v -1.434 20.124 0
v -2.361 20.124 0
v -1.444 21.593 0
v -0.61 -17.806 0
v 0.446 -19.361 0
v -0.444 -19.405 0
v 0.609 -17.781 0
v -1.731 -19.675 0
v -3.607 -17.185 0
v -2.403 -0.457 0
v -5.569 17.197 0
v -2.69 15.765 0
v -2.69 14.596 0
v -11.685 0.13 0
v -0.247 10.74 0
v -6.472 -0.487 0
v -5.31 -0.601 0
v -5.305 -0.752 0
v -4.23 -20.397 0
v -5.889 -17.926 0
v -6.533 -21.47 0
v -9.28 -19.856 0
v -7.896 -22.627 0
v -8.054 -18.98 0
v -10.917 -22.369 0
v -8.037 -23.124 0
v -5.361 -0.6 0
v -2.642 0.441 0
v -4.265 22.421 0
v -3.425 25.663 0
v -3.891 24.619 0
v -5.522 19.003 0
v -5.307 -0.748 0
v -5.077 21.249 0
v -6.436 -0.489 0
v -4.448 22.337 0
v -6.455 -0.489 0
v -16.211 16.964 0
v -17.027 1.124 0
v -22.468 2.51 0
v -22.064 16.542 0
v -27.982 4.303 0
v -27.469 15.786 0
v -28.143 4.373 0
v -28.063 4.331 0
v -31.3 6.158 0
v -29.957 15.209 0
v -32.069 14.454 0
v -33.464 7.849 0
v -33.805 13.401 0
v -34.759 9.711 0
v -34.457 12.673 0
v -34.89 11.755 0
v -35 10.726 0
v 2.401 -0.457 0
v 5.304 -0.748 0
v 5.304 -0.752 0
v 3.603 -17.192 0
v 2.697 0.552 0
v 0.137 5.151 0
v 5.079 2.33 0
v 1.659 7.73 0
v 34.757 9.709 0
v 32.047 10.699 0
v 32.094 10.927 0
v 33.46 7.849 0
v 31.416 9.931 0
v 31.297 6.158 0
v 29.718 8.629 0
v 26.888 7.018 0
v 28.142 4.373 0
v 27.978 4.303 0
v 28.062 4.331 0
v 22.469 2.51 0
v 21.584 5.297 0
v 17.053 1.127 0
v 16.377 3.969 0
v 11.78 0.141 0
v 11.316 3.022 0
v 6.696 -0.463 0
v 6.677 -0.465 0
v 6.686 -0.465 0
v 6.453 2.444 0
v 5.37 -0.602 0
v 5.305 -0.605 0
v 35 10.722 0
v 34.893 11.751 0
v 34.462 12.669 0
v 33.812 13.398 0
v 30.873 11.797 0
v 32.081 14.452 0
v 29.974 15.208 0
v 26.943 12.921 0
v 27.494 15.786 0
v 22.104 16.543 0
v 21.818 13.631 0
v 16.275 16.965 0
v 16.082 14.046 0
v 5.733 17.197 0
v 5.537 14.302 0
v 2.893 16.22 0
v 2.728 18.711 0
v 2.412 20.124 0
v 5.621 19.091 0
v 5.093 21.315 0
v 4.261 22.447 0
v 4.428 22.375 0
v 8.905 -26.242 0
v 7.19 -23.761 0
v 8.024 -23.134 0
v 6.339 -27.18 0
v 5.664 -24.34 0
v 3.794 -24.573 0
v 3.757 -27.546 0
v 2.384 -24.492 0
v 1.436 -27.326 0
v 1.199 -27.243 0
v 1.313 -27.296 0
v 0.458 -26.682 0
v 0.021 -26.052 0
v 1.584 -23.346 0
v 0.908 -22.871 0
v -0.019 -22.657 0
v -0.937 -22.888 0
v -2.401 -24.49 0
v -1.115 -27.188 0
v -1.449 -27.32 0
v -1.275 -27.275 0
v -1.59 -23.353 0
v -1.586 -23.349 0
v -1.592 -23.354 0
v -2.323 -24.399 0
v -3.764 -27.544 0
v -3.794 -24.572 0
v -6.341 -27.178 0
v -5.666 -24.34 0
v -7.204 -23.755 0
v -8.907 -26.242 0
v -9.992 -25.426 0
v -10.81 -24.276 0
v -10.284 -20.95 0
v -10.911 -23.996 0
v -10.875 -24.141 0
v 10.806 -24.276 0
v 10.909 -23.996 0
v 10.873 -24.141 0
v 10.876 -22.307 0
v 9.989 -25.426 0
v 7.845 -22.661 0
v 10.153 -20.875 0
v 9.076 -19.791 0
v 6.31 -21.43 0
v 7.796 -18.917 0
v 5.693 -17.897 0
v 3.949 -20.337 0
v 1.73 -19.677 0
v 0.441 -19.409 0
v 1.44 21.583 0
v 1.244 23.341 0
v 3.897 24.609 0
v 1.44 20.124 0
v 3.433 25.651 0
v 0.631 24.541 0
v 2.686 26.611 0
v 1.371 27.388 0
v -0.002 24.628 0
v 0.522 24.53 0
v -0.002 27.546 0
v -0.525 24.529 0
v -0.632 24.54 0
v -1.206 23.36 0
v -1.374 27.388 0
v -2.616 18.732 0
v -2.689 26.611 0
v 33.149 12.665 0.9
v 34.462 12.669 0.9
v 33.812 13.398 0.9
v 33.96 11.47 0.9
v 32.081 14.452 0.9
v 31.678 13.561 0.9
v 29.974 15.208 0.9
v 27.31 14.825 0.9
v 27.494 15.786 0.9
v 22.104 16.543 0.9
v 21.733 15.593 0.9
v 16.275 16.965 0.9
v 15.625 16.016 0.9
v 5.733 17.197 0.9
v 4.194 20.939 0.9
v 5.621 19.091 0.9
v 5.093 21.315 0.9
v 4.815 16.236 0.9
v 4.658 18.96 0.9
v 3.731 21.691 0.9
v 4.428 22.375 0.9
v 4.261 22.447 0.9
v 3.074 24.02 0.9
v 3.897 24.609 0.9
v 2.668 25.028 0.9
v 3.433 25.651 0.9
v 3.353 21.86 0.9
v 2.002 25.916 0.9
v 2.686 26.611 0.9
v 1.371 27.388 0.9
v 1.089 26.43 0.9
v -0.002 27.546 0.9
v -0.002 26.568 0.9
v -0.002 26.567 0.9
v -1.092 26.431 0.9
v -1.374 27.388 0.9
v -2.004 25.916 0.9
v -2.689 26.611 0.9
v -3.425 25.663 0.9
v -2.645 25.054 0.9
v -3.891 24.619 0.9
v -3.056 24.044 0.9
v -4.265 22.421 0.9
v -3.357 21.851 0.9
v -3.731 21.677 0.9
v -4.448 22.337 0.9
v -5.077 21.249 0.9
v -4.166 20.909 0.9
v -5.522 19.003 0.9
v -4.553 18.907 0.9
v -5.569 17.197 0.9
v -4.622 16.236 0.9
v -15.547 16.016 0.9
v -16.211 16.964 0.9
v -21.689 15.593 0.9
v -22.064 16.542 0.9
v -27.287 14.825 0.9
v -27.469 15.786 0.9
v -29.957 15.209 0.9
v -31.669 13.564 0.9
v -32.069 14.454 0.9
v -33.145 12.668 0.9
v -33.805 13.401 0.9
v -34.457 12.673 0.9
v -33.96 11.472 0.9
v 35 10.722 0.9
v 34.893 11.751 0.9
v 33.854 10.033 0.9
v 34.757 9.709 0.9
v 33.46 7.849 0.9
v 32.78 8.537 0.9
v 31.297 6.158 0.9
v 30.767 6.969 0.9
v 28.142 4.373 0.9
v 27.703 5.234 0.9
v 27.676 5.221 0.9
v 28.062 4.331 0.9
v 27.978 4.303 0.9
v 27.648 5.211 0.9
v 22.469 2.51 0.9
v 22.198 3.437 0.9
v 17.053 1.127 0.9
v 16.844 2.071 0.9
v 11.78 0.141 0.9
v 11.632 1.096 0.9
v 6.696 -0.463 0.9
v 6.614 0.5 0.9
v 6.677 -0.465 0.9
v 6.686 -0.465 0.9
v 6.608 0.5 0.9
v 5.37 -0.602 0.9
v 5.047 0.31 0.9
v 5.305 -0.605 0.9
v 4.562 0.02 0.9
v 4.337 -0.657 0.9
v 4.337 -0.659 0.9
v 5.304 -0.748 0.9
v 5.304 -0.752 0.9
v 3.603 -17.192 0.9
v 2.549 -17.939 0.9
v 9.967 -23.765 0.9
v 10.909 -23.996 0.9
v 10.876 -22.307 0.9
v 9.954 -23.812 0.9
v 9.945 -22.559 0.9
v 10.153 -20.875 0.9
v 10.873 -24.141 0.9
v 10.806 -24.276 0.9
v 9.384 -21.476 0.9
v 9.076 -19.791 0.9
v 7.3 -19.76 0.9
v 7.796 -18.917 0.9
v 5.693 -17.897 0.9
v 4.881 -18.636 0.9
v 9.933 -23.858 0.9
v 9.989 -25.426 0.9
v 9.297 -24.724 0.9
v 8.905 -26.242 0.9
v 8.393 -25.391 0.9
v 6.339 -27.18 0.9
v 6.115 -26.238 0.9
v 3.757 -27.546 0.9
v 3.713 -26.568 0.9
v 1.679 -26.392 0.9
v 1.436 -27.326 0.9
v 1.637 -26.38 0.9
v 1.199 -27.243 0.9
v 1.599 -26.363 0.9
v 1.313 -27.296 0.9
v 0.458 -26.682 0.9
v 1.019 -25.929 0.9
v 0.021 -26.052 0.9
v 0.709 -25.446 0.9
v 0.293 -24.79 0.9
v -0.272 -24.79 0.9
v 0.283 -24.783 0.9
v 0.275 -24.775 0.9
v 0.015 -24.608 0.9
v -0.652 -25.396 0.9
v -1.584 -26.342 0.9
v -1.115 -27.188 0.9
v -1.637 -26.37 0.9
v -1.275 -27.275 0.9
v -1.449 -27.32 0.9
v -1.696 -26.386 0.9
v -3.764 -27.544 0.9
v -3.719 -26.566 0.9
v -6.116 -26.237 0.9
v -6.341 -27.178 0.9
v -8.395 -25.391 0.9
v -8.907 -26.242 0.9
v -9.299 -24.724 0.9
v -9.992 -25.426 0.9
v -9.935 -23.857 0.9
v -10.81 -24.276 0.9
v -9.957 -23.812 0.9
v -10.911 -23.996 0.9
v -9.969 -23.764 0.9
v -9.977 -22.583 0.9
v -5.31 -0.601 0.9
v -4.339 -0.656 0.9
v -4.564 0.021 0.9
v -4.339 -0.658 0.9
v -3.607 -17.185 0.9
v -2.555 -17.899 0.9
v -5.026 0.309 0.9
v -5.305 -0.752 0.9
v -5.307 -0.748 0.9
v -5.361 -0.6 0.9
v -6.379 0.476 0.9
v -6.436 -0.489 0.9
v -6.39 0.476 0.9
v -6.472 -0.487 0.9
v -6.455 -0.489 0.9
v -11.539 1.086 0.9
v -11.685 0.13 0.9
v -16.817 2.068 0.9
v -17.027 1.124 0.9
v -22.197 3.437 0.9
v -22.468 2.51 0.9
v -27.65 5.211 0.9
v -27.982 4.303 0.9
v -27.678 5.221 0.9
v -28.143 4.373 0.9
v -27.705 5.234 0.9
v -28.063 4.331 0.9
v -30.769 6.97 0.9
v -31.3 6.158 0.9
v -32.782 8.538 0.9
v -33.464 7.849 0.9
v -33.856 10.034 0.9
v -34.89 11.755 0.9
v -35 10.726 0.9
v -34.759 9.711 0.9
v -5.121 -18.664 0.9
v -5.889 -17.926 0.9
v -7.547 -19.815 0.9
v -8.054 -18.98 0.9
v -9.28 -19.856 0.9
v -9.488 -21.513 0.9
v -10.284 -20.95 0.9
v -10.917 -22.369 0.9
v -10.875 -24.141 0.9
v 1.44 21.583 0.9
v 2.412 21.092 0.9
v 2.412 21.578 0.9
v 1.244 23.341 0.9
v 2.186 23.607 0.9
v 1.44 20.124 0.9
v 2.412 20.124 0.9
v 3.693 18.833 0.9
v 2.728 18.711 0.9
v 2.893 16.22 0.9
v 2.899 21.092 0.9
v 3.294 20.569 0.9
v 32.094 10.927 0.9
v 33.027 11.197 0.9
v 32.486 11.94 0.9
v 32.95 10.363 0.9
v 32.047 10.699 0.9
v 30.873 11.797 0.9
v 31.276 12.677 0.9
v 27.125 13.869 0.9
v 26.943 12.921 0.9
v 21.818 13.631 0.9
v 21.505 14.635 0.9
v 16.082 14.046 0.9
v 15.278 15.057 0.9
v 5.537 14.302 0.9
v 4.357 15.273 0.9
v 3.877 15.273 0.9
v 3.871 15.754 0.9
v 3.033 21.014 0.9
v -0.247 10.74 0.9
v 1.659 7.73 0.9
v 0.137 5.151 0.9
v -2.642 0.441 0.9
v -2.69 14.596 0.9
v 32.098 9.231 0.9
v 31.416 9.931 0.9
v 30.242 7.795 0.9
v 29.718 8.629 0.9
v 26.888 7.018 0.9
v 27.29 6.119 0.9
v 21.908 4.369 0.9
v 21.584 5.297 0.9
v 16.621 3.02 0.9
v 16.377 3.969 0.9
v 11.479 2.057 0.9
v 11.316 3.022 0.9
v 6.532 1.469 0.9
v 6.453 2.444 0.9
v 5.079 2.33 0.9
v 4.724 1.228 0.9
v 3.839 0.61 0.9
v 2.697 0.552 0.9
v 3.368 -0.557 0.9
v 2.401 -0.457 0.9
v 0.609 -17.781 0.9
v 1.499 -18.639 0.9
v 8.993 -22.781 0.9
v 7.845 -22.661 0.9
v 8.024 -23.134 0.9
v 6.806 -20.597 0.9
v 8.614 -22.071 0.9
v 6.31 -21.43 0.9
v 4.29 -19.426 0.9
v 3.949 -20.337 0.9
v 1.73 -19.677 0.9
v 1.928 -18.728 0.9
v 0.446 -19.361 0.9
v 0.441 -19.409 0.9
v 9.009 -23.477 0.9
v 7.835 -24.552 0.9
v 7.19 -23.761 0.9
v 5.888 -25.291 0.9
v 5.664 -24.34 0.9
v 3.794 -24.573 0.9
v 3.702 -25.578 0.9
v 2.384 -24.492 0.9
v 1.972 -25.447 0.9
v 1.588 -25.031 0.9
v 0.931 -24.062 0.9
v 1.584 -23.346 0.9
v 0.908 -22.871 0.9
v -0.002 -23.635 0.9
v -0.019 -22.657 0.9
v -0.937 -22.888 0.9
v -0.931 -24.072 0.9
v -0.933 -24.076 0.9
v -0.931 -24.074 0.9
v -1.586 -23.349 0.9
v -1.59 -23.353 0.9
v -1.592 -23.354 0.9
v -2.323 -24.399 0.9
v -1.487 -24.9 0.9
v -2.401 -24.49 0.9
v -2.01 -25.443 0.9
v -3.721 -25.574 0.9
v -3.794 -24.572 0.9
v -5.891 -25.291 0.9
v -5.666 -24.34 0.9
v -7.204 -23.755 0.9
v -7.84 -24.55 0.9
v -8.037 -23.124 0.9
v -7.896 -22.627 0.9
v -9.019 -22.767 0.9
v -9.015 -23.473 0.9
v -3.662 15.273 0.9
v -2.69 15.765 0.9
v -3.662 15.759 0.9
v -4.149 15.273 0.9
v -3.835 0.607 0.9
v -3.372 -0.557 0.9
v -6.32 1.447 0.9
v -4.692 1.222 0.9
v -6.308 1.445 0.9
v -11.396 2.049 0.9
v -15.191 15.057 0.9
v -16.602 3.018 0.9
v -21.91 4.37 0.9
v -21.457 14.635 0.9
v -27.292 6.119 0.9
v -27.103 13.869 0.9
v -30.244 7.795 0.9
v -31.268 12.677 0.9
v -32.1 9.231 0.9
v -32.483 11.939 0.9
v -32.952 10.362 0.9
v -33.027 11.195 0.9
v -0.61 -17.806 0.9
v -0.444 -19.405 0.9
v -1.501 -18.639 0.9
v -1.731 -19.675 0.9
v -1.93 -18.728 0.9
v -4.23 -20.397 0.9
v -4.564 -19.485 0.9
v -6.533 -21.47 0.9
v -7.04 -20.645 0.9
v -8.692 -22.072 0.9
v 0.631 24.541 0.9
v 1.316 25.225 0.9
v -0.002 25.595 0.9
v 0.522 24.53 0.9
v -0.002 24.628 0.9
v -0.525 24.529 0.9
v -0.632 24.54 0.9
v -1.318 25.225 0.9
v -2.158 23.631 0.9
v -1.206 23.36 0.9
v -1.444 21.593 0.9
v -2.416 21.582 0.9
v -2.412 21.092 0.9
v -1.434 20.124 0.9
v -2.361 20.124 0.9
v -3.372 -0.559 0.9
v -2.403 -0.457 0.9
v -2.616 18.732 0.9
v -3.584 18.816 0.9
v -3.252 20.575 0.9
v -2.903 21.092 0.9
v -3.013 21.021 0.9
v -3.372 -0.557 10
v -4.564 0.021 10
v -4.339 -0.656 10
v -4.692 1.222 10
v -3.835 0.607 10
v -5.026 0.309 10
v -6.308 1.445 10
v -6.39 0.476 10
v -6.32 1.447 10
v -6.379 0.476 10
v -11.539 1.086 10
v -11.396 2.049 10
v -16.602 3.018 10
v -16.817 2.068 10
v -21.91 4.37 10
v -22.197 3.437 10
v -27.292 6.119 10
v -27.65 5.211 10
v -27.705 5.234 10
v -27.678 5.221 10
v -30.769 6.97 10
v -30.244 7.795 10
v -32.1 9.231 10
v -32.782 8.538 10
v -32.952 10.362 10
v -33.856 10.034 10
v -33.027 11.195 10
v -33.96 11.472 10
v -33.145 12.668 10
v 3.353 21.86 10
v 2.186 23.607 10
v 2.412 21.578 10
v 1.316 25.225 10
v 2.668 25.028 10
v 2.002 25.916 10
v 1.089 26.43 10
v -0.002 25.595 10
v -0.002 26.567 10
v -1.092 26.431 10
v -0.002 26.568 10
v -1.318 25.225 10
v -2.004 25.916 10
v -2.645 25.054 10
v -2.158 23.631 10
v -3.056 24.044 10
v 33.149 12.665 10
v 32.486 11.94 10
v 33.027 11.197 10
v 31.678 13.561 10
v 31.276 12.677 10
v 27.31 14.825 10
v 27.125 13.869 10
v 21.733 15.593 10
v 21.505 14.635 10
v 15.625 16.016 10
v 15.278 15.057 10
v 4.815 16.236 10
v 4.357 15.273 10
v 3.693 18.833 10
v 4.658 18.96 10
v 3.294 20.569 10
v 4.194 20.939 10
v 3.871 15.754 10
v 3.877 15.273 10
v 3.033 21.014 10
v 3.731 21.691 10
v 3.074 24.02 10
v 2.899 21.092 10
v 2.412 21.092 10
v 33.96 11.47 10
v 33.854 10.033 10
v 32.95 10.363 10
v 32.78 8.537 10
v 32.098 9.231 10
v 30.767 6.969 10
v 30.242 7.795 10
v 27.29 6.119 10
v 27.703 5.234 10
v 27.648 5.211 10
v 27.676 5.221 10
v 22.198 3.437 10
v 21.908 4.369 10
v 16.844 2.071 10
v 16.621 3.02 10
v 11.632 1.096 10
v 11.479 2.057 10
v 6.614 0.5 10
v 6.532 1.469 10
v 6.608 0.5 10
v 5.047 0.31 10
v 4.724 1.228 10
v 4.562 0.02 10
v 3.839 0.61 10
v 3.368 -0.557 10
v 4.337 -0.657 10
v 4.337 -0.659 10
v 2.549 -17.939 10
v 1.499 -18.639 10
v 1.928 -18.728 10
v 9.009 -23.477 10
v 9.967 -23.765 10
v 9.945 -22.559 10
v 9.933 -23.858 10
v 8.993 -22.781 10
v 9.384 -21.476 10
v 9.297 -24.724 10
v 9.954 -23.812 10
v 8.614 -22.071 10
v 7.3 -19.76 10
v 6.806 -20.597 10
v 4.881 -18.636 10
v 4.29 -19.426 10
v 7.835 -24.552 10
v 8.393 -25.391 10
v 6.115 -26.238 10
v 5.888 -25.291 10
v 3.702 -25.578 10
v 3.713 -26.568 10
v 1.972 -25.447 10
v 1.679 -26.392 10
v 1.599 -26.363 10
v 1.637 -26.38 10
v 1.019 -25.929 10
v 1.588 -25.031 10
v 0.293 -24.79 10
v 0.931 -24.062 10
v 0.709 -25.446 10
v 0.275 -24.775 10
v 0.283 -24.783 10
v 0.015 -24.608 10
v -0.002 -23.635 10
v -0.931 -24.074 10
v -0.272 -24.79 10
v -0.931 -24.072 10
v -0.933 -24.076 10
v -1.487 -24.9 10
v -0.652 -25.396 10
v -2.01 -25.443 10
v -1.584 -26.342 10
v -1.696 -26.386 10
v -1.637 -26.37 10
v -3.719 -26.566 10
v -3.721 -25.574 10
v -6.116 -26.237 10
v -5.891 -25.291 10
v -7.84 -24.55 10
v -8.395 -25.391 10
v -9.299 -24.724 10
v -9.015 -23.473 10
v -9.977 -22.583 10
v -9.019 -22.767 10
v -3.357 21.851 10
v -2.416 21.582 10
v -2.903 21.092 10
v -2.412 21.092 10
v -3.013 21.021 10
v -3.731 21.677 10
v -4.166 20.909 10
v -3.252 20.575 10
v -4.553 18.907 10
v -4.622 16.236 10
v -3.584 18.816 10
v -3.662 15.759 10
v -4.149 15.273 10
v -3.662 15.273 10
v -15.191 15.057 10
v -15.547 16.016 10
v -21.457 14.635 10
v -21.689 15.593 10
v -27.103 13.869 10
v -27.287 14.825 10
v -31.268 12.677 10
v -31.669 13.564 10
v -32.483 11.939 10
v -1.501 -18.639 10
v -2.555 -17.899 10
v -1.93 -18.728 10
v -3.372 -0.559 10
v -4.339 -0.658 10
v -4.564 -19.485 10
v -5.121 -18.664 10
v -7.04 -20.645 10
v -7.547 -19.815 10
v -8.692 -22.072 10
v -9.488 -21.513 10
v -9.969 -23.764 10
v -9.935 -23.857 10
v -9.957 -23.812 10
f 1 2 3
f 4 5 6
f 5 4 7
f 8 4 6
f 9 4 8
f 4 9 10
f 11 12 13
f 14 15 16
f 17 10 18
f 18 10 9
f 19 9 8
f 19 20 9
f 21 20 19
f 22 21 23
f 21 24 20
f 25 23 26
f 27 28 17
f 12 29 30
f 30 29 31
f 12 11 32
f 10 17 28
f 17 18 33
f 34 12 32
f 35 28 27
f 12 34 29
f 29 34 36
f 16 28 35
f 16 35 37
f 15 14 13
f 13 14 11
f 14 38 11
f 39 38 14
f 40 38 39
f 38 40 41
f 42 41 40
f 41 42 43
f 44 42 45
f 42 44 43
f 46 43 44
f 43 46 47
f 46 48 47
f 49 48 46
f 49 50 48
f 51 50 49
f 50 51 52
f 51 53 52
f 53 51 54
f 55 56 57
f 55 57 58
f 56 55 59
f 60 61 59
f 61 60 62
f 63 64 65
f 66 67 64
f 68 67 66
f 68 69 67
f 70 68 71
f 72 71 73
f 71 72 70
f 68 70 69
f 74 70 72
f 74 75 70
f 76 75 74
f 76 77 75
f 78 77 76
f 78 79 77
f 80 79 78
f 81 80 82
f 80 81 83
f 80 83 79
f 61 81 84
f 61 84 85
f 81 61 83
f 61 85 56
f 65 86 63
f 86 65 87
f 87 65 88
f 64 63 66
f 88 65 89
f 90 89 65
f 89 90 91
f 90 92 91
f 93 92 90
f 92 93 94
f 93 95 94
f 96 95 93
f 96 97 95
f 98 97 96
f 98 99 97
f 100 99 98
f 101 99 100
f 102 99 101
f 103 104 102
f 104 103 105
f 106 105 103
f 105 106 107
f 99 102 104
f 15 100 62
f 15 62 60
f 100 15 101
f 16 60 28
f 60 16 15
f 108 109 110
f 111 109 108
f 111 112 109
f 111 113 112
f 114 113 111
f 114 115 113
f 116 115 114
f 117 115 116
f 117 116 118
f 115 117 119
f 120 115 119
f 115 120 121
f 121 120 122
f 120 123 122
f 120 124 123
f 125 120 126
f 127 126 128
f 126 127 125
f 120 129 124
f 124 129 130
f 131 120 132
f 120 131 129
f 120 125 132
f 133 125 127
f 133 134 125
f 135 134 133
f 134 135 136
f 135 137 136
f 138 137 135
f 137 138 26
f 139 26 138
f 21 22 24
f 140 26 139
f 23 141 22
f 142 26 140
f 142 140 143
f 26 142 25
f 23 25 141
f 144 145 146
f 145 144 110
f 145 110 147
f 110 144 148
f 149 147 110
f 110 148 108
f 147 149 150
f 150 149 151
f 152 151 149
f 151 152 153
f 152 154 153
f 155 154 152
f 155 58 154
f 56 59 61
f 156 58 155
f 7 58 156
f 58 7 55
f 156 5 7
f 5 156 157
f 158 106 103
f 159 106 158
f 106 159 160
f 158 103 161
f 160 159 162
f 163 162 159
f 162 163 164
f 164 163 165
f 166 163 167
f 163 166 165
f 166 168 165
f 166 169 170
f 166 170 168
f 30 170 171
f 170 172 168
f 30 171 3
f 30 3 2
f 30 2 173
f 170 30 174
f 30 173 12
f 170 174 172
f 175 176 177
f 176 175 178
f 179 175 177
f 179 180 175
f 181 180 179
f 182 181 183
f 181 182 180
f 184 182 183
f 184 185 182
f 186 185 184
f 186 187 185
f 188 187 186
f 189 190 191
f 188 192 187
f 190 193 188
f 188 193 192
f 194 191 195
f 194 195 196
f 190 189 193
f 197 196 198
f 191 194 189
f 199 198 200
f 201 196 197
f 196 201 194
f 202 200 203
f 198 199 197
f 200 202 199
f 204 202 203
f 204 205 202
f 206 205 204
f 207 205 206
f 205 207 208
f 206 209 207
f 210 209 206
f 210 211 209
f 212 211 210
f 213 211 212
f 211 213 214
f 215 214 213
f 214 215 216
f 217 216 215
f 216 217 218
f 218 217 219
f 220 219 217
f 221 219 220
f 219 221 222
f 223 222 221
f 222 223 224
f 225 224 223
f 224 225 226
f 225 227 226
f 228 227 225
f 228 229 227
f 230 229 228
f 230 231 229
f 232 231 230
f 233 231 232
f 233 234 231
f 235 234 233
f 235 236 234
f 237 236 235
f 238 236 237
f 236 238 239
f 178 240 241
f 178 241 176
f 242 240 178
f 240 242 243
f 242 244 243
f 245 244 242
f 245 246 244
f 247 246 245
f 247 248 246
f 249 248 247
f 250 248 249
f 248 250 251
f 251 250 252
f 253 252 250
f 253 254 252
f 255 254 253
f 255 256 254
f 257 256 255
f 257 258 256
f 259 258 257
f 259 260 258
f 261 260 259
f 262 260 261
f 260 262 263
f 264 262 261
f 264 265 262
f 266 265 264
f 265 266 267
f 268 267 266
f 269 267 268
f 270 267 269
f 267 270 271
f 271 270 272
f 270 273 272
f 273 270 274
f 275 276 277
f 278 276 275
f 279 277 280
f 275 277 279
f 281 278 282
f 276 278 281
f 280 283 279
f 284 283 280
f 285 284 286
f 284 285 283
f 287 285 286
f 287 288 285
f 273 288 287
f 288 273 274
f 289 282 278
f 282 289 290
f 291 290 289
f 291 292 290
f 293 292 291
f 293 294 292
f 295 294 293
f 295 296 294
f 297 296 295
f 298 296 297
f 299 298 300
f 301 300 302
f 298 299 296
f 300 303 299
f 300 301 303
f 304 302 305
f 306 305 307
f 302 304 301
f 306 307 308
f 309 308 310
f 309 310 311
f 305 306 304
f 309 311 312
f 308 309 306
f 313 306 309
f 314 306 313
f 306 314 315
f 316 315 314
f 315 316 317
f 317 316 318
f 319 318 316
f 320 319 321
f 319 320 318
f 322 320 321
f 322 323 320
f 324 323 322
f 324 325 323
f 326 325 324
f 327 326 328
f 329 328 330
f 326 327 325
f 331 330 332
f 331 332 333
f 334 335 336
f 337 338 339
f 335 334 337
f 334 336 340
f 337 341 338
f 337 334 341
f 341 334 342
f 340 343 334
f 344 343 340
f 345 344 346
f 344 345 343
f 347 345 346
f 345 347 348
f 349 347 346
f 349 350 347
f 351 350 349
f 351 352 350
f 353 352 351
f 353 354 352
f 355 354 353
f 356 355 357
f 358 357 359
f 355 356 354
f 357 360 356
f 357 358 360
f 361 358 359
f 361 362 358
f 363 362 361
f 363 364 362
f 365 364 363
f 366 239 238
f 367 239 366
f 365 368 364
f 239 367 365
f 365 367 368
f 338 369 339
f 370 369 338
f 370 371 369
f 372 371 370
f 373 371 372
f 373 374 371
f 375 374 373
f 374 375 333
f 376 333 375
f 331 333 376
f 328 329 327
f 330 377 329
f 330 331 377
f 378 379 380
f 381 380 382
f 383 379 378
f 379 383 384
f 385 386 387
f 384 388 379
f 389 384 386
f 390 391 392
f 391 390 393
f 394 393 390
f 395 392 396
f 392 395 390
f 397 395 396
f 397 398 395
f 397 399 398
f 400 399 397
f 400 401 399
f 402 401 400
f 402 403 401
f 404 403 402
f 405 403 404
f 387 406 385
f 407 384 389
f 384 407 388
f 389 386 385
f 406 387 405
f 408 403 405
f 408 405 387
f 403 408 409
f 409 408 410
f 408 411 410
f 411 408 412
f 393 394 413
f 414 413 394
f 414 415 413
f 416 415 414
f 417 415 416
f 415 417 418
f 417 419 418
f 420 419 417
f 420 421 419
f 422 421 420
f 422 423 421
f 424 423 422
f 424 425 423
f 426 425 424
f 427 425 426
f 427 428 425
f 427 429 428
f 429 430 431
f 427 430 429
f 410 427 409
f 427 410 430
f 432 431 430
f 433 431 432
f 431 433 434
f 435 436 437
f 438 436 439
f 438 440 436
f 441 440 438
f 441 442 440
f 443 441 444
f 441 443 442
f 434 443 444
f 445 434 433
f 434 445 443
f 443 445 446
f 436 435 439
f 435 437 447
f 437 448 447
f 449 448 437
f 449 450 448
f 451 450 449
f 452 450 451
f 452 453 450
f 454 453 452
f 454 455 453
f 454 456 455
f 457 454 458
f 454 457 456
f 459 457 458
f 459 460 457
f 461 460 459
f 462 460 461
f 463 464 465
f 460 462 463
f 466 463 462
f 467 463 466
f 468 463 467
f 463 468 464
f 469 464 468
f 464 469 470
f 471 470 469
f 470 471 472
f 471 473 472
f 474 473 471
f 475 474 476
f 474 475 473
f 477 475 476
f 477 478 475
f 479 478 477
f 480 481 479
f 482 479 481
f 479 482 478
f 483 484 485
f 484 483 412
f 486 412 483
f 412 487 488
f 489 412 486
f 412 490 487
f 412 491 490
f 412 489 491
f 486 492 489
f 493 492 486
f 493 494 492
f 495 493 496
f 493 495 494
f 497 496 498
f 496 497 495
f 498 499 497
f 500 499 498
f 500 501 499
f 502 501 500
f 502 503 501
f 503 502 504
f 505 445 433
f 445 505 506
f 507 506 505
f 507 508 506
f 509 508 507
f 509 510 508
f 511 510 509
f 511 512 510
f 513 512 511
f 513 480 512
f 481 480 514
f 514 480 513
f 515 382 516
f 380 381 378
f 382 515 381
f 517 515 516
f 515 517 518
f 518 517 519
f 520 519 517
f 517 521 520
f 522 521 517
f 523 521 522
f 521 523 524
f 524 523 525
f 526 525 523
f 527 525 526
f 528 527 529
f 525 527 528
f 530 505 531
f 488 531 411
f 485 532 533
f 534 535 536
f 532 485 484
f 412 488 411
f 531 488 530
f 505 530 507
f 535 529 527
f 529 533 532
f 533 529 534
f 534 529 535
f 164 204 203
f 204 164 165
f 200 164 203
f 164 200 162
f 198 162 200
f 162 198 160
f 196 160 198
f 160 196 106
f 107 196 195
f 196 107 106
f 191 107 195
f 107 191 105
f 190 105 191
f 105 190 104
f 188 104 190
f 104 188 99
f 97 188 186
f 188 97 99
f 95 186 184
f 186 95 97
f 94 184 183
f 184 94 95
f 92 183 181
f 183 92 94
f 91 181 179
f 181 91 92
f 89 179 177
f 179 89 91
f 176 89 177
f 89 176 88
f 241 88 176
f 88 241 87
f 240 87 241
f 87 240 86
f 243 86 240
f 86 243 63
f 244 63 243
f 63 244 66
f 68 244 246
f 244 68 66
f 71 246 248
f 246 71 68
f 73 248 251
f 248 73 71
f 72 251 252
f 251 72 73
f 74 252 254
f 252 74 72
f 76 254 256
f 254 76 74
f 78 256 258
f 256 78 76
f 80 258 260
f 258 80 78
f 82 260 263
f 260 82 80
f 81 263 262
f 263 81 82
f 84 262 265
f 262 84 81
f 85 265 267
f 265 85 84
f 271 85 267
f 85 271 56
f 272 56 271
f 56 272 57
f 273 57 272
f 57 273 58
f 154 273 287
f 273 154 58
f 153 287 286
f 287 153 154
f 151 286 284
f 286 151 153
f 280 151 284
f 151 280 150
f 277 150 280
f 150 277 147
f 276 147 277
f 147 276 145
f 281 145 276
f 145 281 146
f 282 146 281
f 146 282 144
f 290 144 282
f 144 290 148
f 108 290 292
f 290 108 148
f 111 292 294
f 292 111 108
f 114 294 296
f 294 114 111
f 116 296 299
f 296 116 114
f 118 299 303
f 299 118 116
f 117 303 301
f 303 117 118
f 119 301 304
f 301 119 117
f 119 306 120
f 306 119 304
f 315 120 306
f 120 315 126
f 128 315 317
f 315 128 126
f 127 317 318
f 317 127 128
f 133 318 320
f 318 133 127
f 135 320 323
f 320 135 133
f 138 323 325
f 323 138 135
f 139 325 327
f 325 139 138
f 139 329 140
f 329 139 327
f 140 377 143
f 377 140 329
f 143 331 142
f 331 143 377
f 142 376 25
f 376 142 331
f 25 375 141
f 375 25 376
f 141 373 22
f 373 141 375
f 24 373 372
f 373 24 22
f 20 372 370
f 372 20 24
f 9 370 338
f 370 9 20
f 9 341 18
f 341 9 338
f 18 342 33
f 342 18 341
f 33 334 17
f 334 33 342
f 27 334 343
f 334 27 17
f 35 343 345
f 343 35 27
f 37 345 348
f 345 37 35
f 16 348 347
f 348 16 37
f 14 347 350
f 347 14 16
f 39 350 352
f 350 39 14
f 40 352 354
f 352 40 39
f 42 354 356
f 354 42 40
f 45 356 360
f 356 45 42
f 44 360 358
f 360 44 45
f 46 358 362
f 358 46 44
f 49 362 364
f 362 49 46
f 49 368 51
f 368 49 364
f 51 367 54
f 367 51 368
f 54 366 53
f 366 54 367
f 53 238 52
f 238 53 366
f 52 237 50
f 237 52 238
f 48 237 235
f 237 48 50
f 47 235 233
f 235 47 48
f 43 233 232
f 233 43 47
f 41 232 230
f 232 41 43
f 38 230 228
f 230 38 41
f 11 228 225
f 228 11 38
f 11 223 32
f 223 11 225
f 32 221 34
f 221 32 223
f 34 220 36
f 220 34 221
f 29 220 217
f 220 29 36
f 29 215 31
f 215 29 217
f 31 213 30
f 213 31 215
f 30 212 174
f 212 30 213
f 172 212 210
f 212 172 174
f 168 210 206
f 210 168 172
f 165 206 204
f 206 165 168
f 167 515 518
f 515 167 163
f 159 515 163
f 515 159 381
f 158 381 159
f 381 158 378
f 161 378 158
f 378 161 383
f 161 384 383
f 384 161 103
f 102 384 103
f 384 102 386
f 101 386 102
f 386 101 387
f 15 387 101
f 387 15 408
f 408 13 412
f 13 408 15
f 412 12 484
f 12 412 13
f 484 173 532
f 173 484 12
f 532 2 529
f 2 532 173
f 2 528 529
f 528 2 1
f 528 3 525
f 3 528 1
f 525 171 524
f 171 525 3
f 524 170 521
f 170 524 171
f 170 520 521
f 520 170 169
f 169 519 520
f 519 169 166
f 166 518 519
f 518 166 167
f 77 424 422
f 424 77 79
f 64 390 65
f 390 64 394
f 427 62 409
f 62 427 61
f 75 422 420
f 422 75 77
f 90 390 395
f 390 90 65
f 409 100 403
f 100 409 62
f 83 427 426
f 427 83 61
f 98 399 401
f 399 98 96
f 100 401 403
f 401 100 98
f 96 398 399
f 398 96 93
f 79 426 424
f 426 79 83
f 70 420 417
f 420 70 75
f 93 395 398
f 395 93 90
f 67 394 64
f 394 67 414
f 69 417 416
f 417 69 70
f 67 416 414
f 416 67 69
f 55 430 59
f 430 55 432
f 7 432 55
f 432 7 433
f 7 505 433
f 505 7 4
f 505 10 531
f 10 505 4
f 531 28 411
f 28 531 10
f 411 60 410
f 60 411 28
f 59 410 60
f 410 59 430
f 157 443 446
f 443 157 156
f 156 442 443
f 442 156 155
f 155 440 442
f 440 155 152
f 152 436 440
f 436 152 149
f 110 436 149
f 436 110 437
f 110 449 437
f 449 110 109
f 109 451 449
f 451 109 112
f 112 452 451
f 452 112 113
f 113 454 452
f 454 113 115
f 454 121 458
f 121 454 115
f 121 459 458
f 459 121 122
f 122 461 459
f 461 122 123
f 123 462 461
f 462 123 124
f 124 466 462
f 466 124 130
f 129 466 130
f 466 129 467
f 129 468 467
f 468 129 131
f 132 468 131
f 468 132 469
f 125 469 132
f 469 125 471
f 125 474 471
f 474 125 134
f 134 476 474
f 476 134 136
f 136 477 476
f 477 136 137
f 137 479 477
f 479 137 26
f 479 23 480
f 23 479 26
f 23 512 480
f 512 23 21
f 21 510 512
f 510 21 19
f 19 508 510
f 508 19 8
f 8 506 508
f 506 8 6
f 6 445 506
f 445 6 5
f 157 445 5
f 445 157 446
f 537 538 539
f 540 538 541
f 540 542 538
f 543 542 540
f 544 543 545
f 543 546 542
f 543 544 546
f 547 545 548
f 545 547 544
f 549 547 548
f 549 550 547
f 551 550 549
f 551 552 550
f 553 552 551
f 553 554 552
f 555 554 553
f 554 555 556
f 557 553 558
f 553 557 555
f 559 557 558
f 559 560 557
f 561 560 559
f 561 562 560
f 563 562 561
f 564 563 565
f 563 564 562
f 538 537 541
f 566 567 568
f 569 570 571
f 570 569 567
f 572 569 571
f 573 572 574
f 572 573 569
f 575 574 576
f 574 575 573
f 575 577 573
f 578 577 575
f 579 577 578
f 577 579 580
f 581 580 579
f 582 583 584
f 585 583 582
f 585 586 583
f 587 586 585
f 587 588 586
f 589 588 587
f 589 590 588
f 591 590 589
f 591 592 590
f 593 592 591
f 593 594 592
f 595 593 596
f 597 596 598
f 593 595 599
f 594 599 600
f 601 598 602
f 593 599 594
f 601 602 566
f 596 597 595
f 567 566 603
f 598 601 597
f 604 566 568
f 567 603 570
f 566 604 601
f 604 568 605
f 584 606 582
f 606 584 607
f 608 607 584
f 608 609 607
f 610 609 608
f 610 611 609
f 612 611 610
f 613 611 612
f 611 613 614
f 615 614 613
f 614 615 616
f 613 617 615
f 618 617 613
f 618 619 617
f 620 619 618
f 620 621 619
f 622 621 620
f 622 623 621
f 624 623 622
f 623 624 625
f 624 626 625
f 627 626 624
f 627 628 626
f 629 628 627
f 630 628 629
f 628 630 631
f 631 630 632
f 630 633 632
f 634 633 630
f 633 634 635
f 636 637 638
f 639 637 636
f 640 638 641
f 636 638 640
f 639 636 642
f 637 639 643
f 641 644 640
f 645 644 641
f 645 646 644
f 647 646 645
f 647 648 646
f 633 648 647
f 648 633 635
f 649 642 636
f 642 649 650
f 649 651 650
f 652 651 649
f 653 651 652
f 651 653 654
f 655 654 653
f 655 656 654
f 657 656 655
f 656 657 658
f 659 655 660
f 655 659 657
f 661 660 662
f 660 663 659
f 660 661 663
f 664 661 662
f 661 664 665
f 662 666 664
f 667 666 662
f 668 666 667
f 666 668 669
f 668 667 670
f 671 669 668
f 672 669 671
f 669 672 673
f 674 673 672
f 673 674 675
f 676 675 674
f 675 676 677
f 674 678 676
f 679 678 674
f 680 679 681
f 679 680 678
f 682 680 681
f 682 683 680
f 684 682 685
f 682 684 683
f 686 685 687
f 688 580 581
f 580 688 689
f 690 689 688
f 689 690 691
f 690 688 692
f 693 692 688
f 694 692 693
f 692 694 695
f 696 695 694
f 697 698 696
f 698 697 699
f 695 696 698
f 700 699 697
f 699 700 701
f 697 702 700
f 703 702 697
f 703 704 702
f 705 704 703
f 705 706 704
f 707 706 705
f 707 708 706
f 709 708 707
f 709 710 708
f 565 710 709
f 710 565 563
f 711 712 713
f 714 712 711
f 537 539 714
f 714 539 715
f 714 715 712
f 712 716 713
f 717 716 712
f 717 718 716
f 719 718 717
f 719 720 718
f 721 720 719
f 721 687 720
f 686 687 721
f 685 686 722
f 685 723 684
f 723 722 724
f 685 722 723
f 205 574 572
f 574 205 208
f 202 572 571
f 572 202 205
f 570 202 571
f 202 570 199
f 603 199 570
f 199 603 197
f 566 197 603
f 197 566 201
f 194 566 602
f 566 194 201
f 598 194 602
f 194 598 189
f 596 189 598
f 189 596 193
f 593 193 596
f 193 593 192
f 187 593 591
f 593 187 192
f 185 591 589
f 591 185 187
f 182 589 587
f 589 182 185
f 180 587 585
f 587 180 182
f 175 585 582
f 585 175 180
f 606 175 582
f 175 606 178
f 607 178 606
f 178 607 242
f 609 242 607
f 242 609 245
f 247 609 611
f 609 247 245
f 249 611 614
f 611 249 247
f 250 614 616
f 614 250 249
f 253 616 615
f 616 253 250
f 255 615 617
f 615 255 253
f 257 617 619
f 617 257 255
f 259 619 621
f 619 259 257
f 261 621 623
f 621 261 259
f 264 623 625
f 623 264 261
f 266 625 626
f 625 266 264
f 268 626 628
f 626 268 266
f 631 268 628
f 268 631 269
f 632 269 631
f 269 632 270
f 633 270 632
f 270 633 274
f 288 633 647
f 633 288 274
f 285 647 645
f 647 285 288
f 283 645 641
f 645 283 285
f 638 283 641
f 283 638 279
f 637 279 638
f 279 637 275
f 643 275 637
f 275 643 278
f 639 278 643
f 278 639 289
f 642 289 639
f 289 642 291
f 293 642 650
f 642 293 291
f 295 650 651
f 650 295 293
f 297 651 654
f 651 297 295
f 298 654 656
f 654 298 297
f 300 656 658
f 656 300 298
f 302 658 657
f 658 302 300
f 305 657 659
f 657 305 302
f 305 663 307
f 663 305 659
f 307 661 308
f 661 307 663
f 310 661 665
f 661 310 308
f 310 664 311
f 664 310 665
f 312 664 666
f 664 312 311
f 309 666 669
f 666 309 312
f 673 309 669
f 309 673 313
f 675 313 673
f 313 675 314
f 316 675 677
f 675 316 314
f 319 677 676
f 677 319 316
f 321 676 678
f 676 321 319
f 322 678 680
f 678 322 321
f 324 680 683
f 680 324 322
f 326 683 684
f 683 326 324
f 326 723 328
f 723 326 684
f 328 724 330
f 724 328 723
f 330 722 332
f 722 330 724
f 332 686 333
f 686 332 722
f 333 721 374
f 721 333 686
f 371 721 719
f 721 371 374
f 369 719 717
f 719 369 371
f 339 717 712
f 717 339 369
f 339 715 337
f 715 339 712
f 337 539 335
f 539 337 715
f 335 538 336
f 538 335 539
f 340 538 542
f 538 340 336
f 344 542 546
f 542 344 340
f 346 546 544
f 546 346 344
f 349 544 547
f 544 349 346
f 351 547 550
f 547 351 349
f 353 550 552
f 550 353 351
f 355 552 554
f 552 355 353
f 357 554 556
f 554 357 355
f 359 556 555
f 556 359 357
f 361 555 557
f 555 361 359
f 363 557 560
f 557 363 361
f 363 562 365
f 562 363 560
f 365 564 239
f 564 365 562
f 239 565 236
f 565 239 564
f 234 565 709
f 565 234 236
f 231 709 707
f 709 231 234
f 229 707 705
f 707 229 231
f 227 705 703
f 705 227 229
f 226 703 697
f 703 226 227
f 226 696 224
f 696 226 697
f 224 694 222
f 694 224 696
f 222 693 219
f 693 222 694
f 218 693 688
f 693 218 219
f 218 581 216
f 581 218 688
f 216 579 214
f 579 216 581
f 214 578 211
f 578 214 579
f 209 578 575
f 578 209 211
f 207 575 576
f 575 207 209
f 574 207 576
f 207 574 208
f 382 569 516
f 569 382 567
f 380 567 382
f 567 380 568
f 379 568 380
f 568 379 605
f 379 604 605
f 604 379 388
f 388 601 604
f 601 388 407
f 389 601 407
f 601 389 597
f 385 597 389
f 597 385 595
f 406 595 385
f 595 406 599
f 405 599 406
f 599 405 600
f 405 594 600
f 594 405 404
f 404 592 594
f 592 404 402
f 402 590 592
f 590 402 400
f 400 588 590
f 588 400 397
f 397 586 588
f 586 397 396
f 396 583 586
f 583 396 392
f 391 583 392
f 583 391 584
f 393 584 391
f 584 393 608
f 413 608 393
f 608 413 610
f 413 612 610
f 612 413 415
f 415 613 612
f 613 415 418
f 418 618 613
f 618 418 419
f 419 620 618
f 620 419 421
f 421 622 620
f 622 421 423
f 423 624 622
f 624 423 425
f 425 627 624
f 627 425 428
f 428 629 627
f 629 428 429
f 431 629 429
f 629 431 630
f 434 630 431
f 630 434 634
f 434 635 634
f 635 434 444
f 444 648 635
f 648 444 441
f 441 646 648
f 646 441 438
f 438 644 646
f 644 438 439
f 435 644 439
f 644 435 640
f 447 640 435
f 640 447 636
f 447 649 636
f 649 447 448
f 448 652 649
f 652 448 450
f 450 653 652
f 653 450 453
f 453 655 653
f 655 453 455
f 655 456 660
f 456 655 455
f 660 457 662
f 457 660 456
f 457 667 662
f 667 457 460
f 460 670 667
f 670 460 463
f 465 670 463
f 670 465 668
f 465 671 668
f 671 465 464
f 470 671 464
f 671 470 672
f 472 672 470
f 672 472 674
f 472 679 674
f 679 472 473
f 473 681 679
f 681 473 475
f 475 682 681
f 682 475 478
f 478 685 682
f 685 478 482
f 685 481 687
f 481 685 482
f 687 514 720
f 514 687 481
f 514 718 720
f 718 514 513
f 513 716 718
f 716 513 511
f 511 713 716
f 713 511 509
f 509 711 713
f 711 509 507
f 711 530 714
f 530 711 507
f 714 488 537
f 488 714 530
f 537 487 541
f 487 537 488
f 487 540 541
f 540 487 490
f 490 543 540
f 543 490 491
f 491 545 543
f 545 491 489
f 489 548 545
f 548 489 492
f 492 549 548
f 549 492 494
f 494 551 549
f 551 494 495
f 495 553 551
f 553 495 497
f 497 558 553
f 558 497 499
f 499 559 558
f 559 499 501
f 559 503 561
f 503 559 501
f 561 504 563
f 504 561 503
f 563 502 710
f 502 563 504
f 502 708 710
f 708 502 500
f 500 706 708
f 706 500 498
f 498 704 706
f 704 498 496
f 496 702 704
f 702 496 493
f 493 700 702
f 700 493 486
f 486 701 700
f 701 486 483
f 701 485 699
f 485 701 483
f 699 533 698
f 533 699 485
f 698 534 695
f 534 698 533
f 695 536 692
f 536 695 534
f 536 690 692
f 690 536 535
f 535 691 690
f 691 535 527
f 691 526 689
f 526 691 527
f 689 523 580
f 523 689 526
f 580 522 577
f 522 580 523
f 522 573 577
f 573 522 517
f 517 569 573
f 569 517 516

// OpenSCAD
// file: shape.scad
// Module names are of the form poly_<inkscape-path-id>().  As a result,
// you can associate a polygon in this OpenSCAD program with the corresponding
// SVG element in the Inkscape document by looking for the XML element with
// the attribute id="inkscape-path-id".

// fudge value is used to ensure that subtracted solids are a tad taller
// in the z dimension than the polygon being subtracted from.  This helps
// keep the resulting .stl file manifold.
fudge = 0.1;

module shape(h)
{
  scale([25.4/90, -25.4/90, 1]) union()
  {
    difference()
    {
       linear_extrude(height=h)
         polygon([[-0.002028,-27.317476],[-1.122322,-27.176346],[-2.060622,-26.647556],[-2.720053,-25.761085],[-3.141839,-24.722758],[-3.451247,-22.467876],[-3.836013,-22.288186],[-4.283278,-21.499126],[-4.681716,-19.440526],[-4.752026,-16.694436],[-15.985517,-16.468408],[-22.300496,-16.033137],[-28.056714,-15.243266],[-32.562573,-13.946386],[-34.079739,-13.025193],[-34.918042,-11.795996],[-34.810950,-10.317131],[-33.707104,-8.778416],[-31.636780,-7.166340],[-28.486401,-5.381936],[-28.459061,-5.368236],[-28.429761,-5.358236],[-22.823024,-3.534388],[-17.291646,-2.126090],[-11.864481,-1.116580],[-6.570385,-0.489096],[-6.564485,-0.489096],[-6.558585,-0.489096],[-5.167960,-0.317216],[-4.692959,-0.021729],[-4.460929,0.674964],[-4.460929,0.676964],[-2.626944,18.403524],[-5.265400,19.190746],[-7.759757,20.374224],[-9.755850,22.120324],[-10.258517,23.220035],[-10.249991,24.434774],[-10.238271,24.483574],[-10.214831,24.530474],[-9.561131,25.421700],[-8.631607,26.107704],[-6.289049,26.977744],[-3.824057,27.315371],[-1.744128,27.130084],[-1.683578,27.114484],[-1.628888,27.085184],[-0.669904,26.112524],[-0.279279,25.489484],[0.015643,25.301984],[0.283221,25.473854],[0.291021,25.481854],[0.300821,25.489854],[0.728556,26.163674],[1.047996,26.660936],[1.644571,27.107034],[1.683631,27.124634],[1.726601,27.136334],[3.817312,27.317476],[6.287148,26.978134],[8.630256,26.107741],[9.559492,25.421842],[10.212930,24.530864],[10.234410,24.483964],[10.248080,24.435164],[10.225259,23.195392],[9.648471,22.081644],[7.505892,20.317974],[5.018742,19.161474],[2.621127,18.444924],[4.459017,0.677354],[4.459017,0.675354],[4.691029,-0.020222],[5.189486,-0.318786],[6.794955,-0.514096],[6.796955,-0.514096],[6.800855,-0.514096],[11.960606,-1.127123],[17.318766,-2.129069],[22.824710,-3.534465],[28.427808,-5.357846],[28.457108,-5.367846],[28.484448,-5.381546],[31.634696,-7.165984],[33.705151,-8.778026],[34.809266,-10.315733],[34.918042,-11.793656],[34.084069,-13.022789],[32.572339,-13.944046],[28.080151,-15.242876],[22.346307,-16.032999],[16.065917,-16.468149],[4.951245,-16.694046],[4.789135,-19.494826],[4.312573,-21.529986],[3.836011,-22.303416],[3.447339,-22.477246],[3.160891,-24.697502],[2.742813,-25.734410],[2.058667,-26.647166],[1.119391,-27.175956],[-0.001880,-27.317086]]);
       translate([0, 0, -fudge])
         linear_extrude(height=h+2*fudge)
           polygon([[-0.002028,-26.317476],[1.353441,-25.936626],[2.247213,-24.273299],[2.480394,-22.186626],[2.480394,-21.686626],[2.980394,-21.686626],[3.119066,-21.606526],[3.386644,-21.149496],[3.796800,-19.364336],[3.980394,-16.198316],[3.986294,-15.704176],[4.480435,-15.704176],[15.708598,-15.481546],[22.111505,-15.047773],[27.890591,-14.260816],[32.158169,-13.034256],[33.402619,-12.276520],[33.958950,-11.512776],[33.879960,-10.655868],[33.003872,-9.491286],[31.095309,-8.014703],[28.060513,-6.292066],[22.526040,-4.492348],[17.089540,-3.104776],[11.802589,-2.115538],[6.716763,-1.510816],[4.857388,-1.262776],[3.947251,-0.627121],[3.462857,0.573164],[1.540982,19.164964],[1.982388,19.256764],[4.411204,19.974077],[6.998013,21.178644],[8.857388,22.694264],[9.246837,23.423666],[9.263638,24.139584],[8.055622,25.244256],[6.054654,26.004814],[3.806452,26.299589],[2.027310,26.164974],[1.632778,25.737234],[0.956997,24.741144],[-0.001987,24.301694],[-0.957065,24.750904],[-0.957065,24.752904],[-0.959065,24.754904],[-1.529378,25.602564],[-2.066487,26.161154],[-3.825517,26.295965],[-6.056722,26.004904],[-8.060980,25.242886],[-9.269612,24.135764],[-9.273129,23.409085],[-8.937581,22.694354],[-7.238362,21.227564],[-4.692610,20.034875],[-1.984456,19.256854],[-1.543050,19.165054],[-3.466878,0.575204],[-3.466878,0.573204],[-3.942931,-0.624414],[-4.824300,-1.256876],[-6.486409,-1.485386],[-6.498129,-1.487386],[-11.717087,-2.106865],[-17.069969,-3.103295],[-22.528044,-4.492940],[-28.062582,-6.292066],[-31.097563,-8.014740],[-33.005941,-9.491286],[-33.881298,-10.654858],[-33.959066,-11.510816],[-33.399865,-12.275484],[-32.150473,-13.034256],[-27.867270,-14.260816],[-22.062020,-15.047815],[-15.620051,-15.481584],[-4.265707,-15.704176],[-3.765707,-15.704176],[-3.765707,-16.204176],[-3.685627,-19.346756],[-3.343830,-21.155356],[-3.097736,-21.614336],[-2.984455,-21.686636],[-2.480549,-21.686636],[-2.484449,-22.190536],[-2.218785,-24.298025],[-1.355543,-25.936636],[-0.002027,-26.317486]]);
    }
  }
}

//shape(1);
// file: base.scad
// Module names are of the form poly_<inkscape-path-id>().  As a result,
// you can associate a polygon in this OpenSCAD program with the corresponding
// SVG element in the Inkscape document by looking for the XML element with
// the attribute id="inkscape-path-id".

// fudge value is used to ensure that subtracted solids are a tad taller
// in the z dimension than the polygon being subtracted from.  This helps
// keep the resulting .stl file manifold.
fudge = 0.1;

module base(h)
{
  scale([25.4/90, -25.4/90, 1]) union()
  {
    difference()
    {
       linear_extrude(height=h)
         polygon([[-0.001669,-28.322826],[-1.413221,-28.161076],[-2.765327,-27.361645],[-3.522135,-26.386887],[-4.001018,-25.314091],[-4.384865,-23.053381],[-4.574000,-22.967598],[-5.220472,-21.848286],[-5.677810,-19.539383],[-5.726385,-17.682132],[-16.668513,-17.442622],[-22.687062,-17.008534],[-28.243874,-16.231058],[-30.802250,-15.637661],[-32.974335,-14.862150],[-34.758400,-13.779426],[-35.429328,-13.030179],[-35.874933,-12.086608],[-35.987564,-11.028406],[-35.739604,-9.984761],[-34.408356,-8.070833],[-32.183130,-6.331827],[-28.937372,-4.496891],[-28.855206,-4.453484],[-28.771490,-4.424544],[-23.102474,-2.580419],[-17.507201,-1.155796],[-12.014824,-0.134098],[-6.654496,0.501254],[-6.636925,0.503321],[-6.617287,0.503321],[-5.511930,0.616491],[-5.460251,0.618041],[-5.457153,0.768939],[-5.455084,0.773071],[-3.708937,17.669715],[-6.055313,18.432298],[-8.281268,19.515080],[-9.541477,20.416694],[-10.574152,21.540796],[-11.225148,22.999821],[-11.218558,24.673421],[-11.181350,24.821733],[-11.115204,24.960742],[-10.273663,26.143346],[-9.158393,26.982534],[-6.519619,27.945057],[-3.870258,28.321396],[-1.489951,28.091300],[-1.310635,28.044276],[-1.146305,27.954876],[0.021585,26.786986],[0.471161,27.434510],[1.232363,28.011203],[1.349669,28.065980],[1.476793,28.097502],[3.863270,28.322826],[6.517828,27.946607],[9.156255,26.982646],[10.270554,26.142996],[11.111346,24.960742],[11.179559,24.821733],[11.216767,24.673421],[11.182860,22.936763],[10.439553,21.464316],[9.332398,20.349616],[8.015928,19.451001],[5.853848,18.401978],[3.705079,17.677467],[5.453293,0.773071],[5.453293,0.768939],[5.454327,0.622177],[5.521508,0.618560],[6.865093,0.478000],[6.874912,0.478000],[6.884731,0.475931],[12.112011,-0.145072],[17.534637,-1.159217],[23.103035,-2.580907],[28.767632,-4.424544],[28.853931,-4.453484],[28.935582,-4.496891],[32.180230,-6.331941],[34.404498,-8.070833],[35.737677,-9.982599],[35.987564,-11.024897],[35.877275,-12.082474],[35.434115,-13.026293],[34.765585,-13.776157],[32.986495,-14.860082],[30.819959,-15.636759],[28.269472,-16.231058],[22.727416,-17.009526],[16.734189,-17.443604],[5.894610,-17.682132],[5.779373,-19.629300],[5.236252,-21.916499],[4.553090,-23.006355],[4.381008,-23.080769],[4.007251,-25.303572],[3.529401,-26.375139],[2.761985,-27.361645],[1.409880,-28.161079],[-0.001669,-28.322826]]);
       translate([0, 0, -fudge])
         linear_extrude(height=h+2*fudge)
           polygon([[-0.001669,-25.323010],[0.536923,-25.221831],[0.648420,-25.233092],[1.278615,-23.999208],[1.480410,-22.191935],[1.480410,-20.691768],[2.480347,-20.691768],[2.804877,-19.238626],[2.974374,-16.678059],[-0.254368,-11.042744],[-2.765843,-15.007877],[-2.765843,-16.209354],[-2.689363,-19.260331],[-2.427880,-20.691768],[-1.474449,-20.691768],[-1.484267,-22.201753],[-1.240008,-24.019527],[-0.650211,-25.232576],[-0.539745,-25.221333],[-0.002188,-25.322493],[-0.001669,-25.323010]]);
       translate([0, 0, -fudge])
         linear_extrude(height=h+2*fudge)
           polygon([[-5.098000,-14.706603],[-1.676503,-8.560209],[-5.208071,-2.395727],[-6.437453,-2.490813],[-6.400247,-2.486677],[-11.539419,-3.096152],[-16.813908,-4.077148],[-22.194549,-5.445008],[-27.652179,-7.215072],[-30.560398,-8.871771],[-32.304608,-10.211271],[-32.951601,-10.998746],[-33.000173,-11.230847],[-31.736167,-12.129500],[-27.677500,-13.285501],[-22.254272,-14.028761],[-16.177716,-14.456206],[-5.098000,-14.706603]]);
       translate([0, 0, -fudge])
         linear_extrude(height=h+2*fudge)
           polygon([[5.693071,-14.705570],[16.535871,-14.442713],[22.434045,-14.015980],[27.703097,-13.285501],[31.744195,-12.129500],[32.999931,-11.234981],[32.950814,-11.000899],[32.302817,-10.211271],[30.556920,-8.872006],[27.646770,-7.215588],[22.193431,-5.446281],[16.838943,-4.081149],[11.635330,-3.107469],[6.634618,-2.512517],[5.222817,-2.396243],[1.705718,-7.948360],[5.693071,-14.705570]]);
       translate([0, 0, -fudge])
         linear_extrude(height=h+2*fudge)
           polygon([[0.140957,-5.296325],[2.773355,-0.567416],[2.468981,0.470248],[0.626197,18.283114],[-0.626957,18.307919],[-2.470772,0.470248],[-2.716750,-0.453209],[0.140957,-5.296325]]);
       translate([0, 0, -fudge])
         linear_extrude(height=h+2*fudge)
           polygon([[0.458250,19.907304],[0.453083,19.956397],[1.779098,20.231831],[4.060256,20.910364],[6.488372,22.034824],[8.066572,23.300379],[8.250023,23.786654],[7.392994,24.431168],[5.824331,25.026888],[3.900669,25.266654],[2.451410,25.182950],[1.628722,24.005245],[0.933216,23.516325],[-0.019240,23.296243],[-0.963058,23.533961],[-1.631029,24.007311],[-1.634646,24.011446],[-1.636712,24.012997],[-2.388605,25.087351],[-2.468703,25.181399],[-3.901472,25.265615],[-5.826122,25.026888],[-7.406976,24.424875],[-8.263699,23.776835],[-8.119004,23.265239],[-6.717022,22.075646],[-4.349218,20.972076],[-1.779339,20.229765],[-0.456941,19.952780],[0.458250,19.907304]]);
    }
  }
}

//base(1);
// main file
include <base.scad>;
include <shape.scad>;
baseh = 0.3+3*0.2;
height=10;
resize([0,0,height])
resize([70,0,0],auto=true)
union(){
  base(baseh);
  shape(height);
};
